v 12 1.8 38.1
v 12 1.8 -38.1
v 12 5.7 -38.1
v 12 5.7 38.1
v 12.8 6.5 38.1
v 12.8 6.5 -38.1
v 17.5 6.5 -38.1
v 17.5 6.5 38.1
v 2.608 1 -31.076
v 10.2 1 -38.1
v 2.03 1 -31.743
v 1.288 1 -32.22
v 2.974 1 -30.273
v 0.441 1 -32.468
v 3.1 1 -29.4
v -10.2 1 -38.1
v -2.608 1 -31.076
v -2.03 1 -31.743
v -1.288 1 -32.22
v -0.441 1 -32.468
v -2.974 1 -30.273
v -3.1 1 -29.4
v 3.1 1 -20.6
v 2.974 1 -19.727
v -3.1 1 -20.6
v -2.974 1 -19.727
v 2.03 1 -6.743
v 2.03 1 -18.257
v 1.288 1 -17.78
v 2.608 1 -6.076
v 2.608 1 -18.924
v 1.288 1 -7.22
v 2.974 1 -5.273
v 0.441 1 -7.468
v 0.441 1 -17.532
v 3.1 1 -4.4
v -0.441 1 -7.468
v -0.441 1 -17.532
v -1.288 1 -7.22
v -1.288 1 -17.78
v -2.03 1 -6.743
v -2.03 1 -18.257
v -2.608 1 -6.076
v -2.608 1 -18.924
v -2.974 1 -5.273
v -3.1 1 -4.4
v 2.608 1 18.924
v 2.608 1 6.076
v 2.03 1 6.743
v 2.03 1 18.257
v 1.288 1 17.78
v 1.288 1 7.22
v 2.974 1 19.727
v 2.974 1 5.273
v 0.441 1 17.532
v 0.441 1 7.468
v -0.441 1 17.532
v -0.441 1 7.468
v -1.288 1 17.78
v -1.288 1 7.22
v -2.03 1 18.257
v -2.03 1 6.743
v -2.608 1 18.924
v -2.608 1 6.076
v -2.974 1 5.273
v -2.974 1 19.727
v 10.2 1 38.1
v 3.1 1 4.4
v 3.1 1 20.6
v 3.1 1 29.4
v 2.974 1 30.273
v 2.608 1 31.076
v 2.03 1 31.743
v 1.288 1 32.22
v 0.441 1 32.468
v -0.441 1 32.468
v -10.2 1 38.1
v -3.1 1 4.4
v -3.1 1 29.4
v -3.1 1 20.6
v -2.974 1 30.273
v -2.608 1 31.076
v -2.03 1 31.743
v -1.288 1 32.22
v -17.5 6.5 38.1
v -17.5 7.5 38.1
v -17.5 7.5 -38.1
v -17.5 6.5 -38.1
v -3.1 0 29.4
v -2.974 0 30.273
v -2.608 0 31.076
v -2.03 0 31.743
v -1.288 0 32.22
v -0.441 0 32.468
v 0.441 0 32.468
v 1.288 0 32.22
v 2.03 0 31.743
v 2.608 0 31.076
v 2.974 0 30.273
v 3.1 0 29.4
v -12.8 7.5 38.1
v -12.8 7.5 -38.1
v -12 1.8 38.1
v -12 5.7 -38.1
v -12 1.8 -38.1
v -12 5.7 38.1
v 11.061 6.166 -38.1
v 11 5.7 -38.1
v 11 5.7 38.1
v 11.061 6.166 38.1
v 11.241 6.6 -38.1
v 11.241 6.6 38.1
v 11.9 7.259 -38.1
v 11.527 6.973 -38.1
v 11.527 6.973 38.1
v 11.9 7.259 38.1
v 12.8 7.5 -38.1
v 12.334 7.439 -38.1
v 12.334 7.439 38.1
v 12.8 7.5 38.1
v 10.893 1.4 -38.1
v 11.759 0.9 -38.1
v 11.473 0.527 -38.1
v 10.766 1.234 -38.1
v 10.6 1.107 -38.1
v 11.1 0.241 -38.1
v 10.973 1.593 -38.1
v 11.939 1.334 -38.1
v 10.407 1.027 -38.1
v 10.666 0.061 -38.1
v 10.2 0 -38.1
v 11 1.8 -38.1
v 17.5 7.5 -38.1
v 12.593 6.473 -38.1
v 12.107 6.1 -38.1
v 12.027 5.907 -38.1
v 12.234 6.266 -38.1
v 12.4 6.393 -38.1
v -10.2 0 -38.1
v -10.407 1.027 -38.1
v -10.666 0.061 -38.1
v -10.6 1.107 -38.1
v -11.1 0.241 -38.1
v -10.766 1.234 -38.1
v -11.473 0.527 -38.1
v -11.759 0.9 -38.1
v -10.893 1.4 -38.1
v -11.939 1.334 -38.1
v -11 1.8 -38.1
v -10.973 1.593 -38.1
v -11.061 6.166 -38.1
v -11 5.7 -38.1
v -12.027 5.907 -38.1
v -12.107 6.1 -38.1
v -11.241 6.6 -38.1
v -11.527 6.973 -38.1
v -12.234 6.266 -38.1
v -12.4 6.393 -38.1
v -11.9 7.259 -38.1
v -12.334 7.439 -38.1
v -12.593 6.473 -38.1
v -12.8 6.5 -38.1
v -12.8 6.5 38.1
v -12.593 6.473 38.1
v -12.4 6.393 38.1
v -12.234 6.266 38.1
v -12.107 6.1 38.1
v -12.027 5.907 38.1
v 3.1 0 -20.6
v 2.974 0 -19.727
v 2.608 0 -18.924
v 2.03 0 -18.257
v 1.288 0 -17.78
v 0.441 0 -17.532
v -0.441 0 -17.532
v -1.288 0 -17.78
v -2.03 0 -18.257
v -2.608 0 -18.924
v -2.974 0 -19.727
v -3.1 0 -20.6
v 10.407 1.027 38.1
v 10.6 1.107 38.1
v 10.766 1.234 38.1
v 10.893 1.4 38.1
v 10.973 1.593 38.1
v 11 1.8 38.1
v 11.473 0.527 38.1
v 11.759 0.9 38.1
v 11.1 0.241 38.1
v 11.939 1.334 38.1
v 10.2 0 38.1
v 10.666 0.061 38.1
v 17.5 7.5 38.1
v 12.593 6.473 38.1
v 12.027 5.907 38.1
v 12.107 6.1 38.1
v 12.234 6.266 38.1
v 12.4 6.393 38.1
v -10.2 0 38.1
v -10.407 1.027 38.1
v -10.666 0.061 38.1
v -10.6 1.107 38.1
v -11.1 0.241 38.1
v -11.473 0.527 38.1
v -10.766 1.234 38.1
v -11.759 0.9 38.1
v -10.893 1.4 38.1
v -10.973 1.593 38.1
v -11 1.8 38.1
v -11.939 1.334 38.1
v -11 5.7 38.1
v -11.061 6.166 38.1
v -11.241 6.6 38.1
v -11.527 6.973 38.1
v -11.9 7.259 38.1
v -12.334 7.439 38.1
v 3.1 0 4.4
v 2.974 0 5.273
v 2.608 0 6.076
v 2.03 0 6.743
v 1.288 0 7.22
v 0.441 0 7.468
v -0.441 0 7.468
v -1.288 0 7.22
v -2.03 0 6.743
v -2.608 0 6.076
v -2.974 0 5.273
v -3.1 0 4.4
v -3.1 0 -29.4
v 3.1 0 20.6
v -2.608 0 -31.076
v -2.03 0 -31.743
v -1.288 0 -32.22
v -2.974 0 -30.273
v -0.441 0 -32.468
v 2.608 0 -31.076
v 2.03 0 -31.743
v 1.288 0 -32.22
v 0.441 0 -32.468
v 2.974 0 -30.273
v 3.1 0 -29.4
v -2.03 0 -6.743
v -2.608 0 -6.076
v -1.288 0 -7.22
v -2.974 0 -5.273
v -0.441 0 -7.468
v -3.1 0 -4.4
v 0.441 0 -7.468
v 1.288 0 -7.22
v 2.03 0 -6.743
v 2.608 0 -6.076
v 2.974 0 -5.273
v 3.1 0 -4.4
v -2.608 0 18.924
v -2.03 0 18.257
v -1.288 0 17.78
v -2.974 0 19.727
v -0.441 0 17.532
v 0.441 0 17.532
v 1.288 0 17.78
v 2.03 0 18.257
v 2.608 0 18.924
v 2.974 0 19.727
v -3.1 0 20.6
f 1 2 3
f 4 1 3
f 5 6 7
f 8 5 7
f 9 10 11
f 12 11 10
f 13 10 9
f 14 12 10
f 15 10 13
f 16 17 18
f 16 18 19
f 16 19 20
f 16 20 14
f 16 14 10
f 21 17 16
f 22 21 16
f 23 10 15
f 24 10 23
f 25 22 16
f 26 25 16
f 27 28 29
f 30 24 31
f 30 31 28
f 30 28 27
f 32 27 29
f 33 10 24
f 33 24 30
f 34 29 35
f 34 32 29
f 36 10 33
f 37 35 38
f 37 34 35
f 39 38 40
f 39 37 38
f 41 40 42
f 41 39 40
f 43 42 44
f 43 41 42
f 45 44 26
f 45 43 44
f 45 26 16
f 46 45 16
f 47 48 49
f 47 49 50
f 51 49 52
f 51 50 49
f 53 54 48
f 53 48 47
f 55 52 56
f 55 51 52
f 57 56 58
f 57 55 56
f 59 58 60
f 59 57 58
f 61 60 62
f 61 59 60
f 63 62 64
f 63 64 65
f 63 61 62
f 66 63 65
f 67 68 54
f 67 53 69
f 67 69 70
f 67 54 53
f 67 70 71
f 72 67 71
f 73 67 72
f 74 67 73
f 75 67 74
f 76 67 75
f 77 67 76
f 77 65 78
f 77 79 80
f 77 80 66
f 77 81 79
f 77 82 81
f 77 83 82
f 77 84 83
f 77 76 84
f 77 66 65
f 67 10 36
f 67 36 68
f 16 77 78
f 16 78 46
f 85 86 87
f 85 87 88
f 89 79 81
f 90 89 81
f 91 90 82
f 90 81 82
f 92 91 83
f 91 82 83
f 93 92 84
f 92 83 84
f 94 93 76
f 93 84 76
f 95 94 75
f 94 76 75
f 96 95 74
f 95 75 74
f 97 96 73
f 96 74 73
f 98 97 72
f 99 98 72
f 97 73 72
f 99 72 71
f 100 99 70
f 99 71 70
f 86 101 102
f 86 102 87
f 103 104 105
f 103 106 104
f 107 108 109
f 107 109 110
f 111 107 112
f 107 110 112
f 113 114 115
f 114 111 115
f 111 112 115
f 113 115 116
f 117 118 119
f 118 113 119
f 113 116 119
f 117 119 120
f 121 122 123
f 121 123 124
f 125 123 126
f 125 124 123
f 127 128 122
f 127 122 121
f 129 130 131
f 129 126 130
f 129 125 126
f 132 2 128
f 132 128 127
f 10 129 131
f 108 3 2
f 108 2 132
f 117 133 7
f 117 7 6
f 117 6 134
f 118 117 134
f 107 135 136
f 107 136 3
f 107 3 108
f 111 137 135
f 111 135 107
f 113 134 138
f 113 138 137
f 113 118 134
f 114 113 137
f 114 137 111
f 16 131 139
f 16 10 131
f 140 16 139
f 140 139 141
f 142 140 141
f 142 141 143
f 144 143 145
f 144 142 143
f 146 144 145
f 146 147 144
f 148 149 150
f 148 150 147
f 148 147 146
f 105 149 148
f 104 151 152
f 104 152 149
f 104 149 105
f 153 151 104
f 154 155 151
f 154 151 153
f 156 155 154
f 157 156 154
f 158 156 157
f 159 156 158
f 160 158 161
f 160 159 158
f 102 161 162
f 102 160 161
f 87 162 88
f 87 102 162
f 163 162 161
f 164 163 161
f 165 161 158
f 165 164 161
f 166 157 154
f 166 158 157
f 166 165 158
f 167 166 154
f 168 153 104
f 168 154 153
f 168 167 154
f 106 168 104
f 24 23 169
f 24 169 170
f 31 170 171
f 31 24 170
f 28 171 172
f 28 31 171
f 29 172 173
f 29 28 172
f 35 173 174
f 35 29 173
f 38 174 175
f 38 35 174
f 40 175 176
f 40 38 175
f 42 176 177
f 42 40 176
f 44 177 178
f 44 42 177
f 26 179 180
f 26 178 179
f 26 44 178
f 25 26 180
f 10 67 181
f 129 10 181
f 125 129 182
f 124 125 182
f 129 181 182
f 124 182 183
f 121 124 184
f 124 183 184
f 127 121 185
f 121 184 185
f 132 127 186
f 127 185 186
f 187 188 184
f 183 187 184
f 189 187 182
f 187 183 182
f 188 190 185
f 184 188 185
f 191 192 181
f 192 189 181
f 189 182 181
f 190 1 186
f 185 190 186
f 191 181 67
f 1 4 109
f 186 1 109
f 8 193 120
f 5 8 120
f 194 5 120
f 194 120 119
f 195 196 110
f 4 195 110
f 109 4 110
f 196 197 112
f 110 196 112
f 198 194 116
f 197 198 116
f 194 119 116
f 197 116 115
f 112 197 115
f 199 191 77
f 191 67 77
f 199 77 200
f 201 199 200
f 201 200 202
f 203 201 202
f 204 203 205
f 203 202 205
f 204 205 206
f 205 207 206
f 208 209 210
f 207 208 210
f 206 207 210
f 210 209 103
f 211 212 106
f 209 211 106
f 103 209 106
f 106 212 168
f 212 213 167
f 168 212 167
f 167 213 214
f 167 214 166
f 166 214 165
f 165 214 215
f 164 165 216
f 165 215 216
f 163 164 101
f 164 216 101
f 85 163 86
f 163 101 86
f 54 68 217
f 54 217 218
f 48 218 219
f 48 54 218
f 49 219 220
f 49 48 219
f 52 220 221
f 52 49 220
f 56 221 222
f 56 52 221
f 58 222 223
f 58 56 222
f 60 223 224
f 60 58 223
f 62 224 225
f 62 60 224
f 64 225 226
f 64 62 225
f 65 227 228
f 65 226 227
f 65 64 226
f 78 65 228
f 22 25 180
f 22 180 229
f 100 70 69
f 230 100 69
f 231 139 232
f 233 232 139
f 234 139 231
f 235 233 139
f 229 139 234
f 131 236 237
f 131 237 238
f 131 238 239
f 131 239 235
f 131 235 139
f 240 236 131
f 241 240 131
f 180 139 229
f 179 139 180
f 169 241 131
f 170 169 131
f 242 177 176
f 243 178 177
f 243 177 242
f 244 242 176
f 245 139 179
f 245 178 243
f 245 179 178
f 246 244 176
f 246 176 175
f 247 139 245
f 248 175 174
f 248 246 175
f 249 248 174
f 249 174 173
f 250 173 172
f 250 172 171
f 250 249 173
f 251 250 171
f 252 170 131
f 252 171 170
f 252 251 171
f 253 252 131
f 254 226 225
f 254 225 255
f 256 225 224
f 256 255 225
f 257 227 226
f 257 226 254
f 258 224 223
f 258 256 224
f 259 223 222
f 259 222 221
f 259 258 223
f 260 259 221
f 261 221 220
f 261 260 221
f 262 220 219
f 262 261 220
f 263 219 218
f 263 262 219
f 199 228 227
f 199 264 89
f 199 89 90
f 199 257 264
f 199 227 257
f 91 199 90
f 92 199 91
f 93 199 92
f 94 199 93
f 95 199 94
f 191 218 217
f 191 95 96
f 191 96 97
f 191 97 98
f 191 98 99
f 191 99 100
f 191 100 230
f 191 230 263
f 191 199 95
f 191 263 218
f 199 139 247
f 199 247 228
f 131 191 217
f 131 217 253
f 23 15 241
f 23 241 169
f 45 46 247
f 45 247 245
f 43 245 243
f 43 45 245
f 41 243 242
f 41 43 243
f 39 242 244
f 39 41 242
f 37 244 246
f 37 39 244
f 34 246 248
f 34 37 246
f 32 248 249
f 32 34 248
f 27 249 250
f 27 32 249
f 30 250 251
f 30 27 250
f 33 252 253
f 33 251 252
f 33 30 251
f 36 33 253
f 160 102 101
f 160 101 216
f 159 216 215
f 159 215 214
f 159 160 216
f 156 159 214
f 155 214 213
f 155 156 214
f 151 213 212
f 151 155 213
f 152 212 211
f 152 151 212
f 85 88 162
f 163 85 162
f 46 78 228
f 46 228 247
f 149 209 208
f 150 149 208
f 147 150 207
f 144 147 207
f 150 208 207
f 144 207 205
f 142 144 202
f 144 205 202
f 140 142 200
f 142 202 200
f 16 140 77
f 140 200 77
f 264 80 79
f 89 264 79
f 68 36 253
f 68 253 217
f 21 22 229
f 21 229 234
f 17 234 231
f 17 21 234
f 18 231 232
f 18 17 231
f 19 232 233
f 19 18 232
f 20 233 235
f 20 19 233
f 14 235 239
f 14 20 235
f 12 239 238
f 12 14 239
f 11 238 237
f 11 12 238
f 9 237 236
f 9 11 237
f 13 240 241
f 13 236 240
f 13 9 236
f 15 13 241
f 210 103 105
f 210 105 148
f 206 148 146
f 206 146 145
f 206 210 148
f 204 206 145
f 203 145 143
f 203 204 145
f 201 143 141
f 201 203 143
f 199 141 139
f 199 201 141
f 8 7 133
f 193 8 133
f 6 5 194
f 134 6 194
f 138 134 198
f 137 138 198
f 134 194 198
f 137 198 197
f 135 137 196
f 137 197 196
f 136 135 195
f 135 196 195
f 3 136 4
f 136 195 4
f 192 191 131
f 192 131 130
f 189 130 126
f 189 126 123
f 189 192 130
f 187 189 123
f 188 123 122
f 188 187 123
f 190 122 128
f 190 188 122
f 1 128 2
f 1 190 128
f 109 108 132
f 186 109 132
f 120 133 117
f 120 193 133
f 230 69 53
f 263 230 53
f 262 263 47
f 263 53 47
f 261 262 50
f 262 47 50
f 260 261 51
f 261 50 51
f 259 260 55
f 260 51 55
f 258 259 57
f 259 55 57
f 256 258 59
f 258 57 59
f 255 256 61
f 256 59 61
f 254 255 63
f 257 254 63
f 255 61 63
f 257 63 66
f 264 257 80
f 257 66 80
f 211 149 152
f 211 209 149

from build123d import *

# Parameters (mm, degrees)
BASE_EXTRUDE_THIN_DEPTH = 254
FILLET1_R               = 0.8
FILLET2_R               = 1.8
CUT_EXTRUDE1_DEPTH      = 255.685099682
LPATTERN1_COUNT         = 10
LPATTERN1_PITCH         = 25
MIRROR1_COPY_1_DEPTH    = 255.685099682
MIRROR1_COPY_2_DEPTH    = 255.685099682
MIRROR1_COPY_3_DEPTH    = 255.685099682
MIRROR1_COPY_4_DEPTH    = 255.685099682
MIRROR1_COPY_5_DEPTH    = 255.685099682
MIRROR1_COPY_6_DEPTH    = 255.685099682
MIRROR1_COPY_7_DEPTH    = 255.685099682
MIRROR1_COPY_8_DEPTH    = 255.685099682
MIRROR1_COPY_9_DEPTH    = 255.685099682
MIRROR1_COPY_10_DEPTH   = 255.685099682
SKETCH3_OUTSIDE_W       = 138.852
SKETCH3_OUTSIDE_H       = 611.852
SKETCH3_OUTSIDE_W_2     = 99.454563768
SKETCH3_OUTSIDE_H_2     = 76.2
CUT_EXTRUDE2_3_DEPTH    = 255.712583121


with BuildPart() as part:
    # Sketch1 → Base-Extrude-Thin (new, symmetric)
    with BuildSketch(Plane.XY):
        Polygon((-17.5, 6.5), (-12, 6.5), (-12, 0), (12, 0), (12, 6.5), (17.5, 6.5), (17.5, 7.5), (11, 7.5), (11, 1), (-11, 1), (-11, 7.5), (-17.5, 7.5), align=None)
    extrude(amount=BASE_EXTRUDE_THIN_DEPTH, both=True)

    # Fillet1
    fillet1_edges = [part.edges().sort_by_distance(p)[0] for p in [
        (-11, 1, 0),
        (11, 1, 0),
        (12, 6.5, 0),
        (-12, 6.5, 0),
    ]]
    fillet(fillet1_edges, radius=FILLET1_R)

    # Fillet2
    fillet2_edges = [part.edges().sort_by_distance(p)[0] for p in [
        (-11, 7.5, 0),
        (11, 7.5, 0),
        (12, 0, 0),
        (-12, 0, 0),
    ]]
    fillet(fillet2_edges, radius=FILLET2_R)

    # Sketch2 → Cut-Extrude1 (cut, through all)
    with BuildSketch(Plane(origin=(0, 1, 0), x_dir=(-1, 0, 0), z_dir=(0, 1, 0))):
        with BuildLine():
            Line((3.1, 4.4), (3.1, -4.4))
            ThreePointArc((3.1, -4.4), (0, -7.5), (-3.1, -4.4))
            Line((-3.1, -4.4), (-3.1, 4.4))
            ThreePointArc((-3.1, 4.4), (0, 7.5), (3.1, 4.4))
        make_face()
    cut_extrude1 = extrude(amount=-CUT_EXTRUDE1_DEPTH, mode=Mode.SUBTRACT)

    # LPattern1: Cut-Extrude1 ×10
    with Locations(*[(0, 0, -i * LPATTERN1_PITCH) for i in range(1, LPATTERN1_COUNT)]):
        add(cut_extrude1, mode=Mode.SUBTRACT)

    # Mirror1 copy 1 sketch → Mirror1 copy 1 (cut, through all)
    with BuildSketch(Plane(origin=(0, 1, 25), x_dir=(-1, 0, 0), z_dir=(0, 1, 0))):
        with BuildLine():
            Line((3.1, -4.4), (3.1, 4.4))
            ThreePointArc((3.1, 4.4), (0, 7.5), (-3.1, 4.4))
            Line((-3.1, 4.4), (-3.1, -4.4))
            ThreePointArc((-3.1, -4.4), (0, -7.5), (3.1, -4.4))
        make_face()
    extrude(amount=-MIRROR1_COPY_1_DEPTH, mode=Mode.SUBTRACT)

    # Mirror1 copy 2 sketch → Mirror1 copy 2 (cut, through all)
    with BuildSketch(Plane(origin=(0, 1, 50), x_dir=(-1, 0, 0), z_dir=(0, 1, 0))):
        with BuildLine():
            Line((3.1, -4.4), (3.1, 4.4))
            ThreePointArc((3.1, 4.4), (0, 7.5), (-3.1, 4.4))
            Line((-3.1, 4.4), (-3.1, -4.4))
            ThreePointArc((-3.1, -4.4), (0, -7.5), (3.1, -4.4))
        make_face()
    extrude(amount=-MIRROR1_COPY_2_DEPTH, mode=Mode.SUBTRACT)

    # Mirror1 copy 3 sketch → Mirror1 copy 3 (cut, through all)
    with BuildSketch(Plane(origin=(0, 1, 75), x_dir=(-1, 0, 0), z_dir=(0, 1, 0))):
        with BuildLine():
            Line((3.1, -4.4), (3.1, 4.4))
            ThreePointArc((3.1, 4.4), (0, 7.5), (-3.1, 4.4))
            Line((-3.1, 4.4), (-3.1, -4.4))
            ThreePointArc((-3.1, -4.4), (0, -7.5), (3.1, -4.4))
        make_face()
    extrude(amount=-MIRROR1_COPY_3_DEPTH, mode=Mode.SUBTRACT)

    # Mirror1 copy 4 sketch → Mirror1 copy 4 (cut, through all)
    with BuildSketch(Plane(origin=(0, 1, 100), x_dir=(-1, 0, 0), z_dir=(0, 1, 0))):
        with BuildLine():
            Line((3.1, -4.4), (3.1, 4.4))
            ThreePointArc((3.1, 4.4), (0, 7.5), (-3.1, 4.4))
            Line((-3.1, 4.4), (-3.1, -4.4))
            ThreePointArc((-3.1, -4.4), (0, -7.5), (3.1, -4.4))
        make_face()
    extrude(amount=-MIRROR1_COPY_4_DEPTH, mode=Mode.SUBTRACT)

    # Mirror1 copy 5 sketch → Mirror1 copy 5 (cut, through all)
    with BuildSketch(Plane(origin=(0, 1, 125), x_dir=(-1, 0, 0), z_dir=(0, 1, 0))):
        with BuildLine():
            Line((3.1, -4.4), (3.1, 4.4))
            ThreePointArc((3.1, 4.4), (0, 7.5), (-3.1, 4.4))
            Line((-3.1, 4.4), (-3.1, -4.4))
            ThreePointArc((-3.1, -4.4), (0, -7.5), (3.1, -4.4))
        make_face()
    extrude(amount=-MIRROR1_COPY_5_DEPTH, mode=Mode.SUBTRACT)

    # Mirror1 copy 6 sketch → Mirror1 copy 6 (cut, through all)
    with BuildSketch(Plane(origin=(0, 1, 150), x_dir=(-1, 0, 0), z_dir=(0, 1, 0))):
        with BuildLine():
            Line((3.1, -4.4), (3.1, 4.4))
            ThreePointArc((3.1, 4.4), (0, 7.5), (-3.1, 4.4))
            Line((-3.1, 4.4), (-3.1, -4.4))
            ThreePointArc((-3.1, -4.4), (0, -7.5), (3.1, -4.4))
        make_face()
    extrude(amount=-MIRROR1_COPY_6_DEPTH, mode=Mode.SUBTRACT)

    # Mirror1 copy 7 sketch → Mirror1 copy 7 (cut, through all)
    with BuildSketch(Plane(origin=(0, 1, 175), x_dir=(-1, 0, 0), z_dir=(0, 1, 0))):
        with BuildLine():
            Line((3.1, -4.4), (3.1, 4.4))
            ThreePointArc((3.1, 4.4), (0, 7.5), (-3.1, 4.4))
            Line((-3.1, 4.4), (-3.1, -4.4))
            ThreePointArc((-3.1, -4.4), (0, -7.5), (3.1, -4.4))
        make_face()
    extrude(amount=-MIRROR1_COPY_7_DEPTH, mode=Mode.SUBTRACT)

    # Mirror1 copy 8 sketch → Mirror1 copy 8 (cut, through all)
    with BuildSketch(Plane(origin=(0, 1, 200), x_dir=(-1, 0, 0), z_dir=(0, 1, 0))):
        with BuildLine():
            Line((3.1, -4.4), (3.1, 4.4))
            ThreePointArc((3.1, 4.4), (0, 7.5), (-3.1, 4.4))
            Line((-3.1, 4.4), (-3.1, -4.4))
            ThreePointArc((-3.1, -4.4), (0, -7.5), (3.1, -4.4))
        make_face()
    extrude(amount=-MIRROR1_COPY_8_DEPTH, mode=Mode.SUBTRACT)

    # Mirror1 copy 9 sketch → Mirror1 copy 9 (cut, through all)
    with BuildSketch(Plane(origin=(0, 1, 225), x_dir=(-1, 0, 0), z_dir=(0, 1, 0))):
        with BuildLine():
            Line((3.1, -4.4), (3.1, 4.4))
            ThreePointArc((3.1, 4.4), (0, 7.5), (-3.1, 4.4))
            Line((-3.1, 4.4), (-3.1, -4.4))
            ThreePointArc((-3.1, -4.4), (0, -7.5), (3.1, -4.4))
        make_face()
    extrude(amount=-MIRROR1_COPY_9_DEPTH, mode=Mode.SUBTRACT)

    # Mirror1 copy 10 sketch → Mirror1 copy 10 (cut, through all)
    with BuildSketch(Plane(origin=(0, 1, 0), x_dir=(-1, 0, 0), z_dir=(0, 1, 0))):
        with BuildLine():
            Line((3.1, -4.4), (3.1, 4.4))
            ThreePointArc((3.1, 4.4), (0, 7.5), (-3.1, 4.4))
            Line((-3.1, 4.4), (-3.1, -4.4))
            ThreePointArc((-3.1, -4.4), (0, -7.5), (3.1, -4.4))
        make_face()
    extrude(amount=-MIRROR1_COPY_10_DEPTH, mode=Mode.SUBTRACT)

    # Sketch3 outside → Cut-Extrude2 (3") (cut, through all)
    with BuildSketch(Plane(origin=(0, 7.5, 0), x_dir=(-1, 0, 0), z_dir=(0, 1, 0))):
        Rectangle(SKETCH3_OUTSIDE_W, SKETCH3_OUTSIDE_H)
        with Locations((-1.499324946, 0)):
            Rectangle(SKETCH3_OUTSIDE_W_2, SKETCH3_OUTSIDE_H_2, mode=Mode.SUBTRACT)
    extrude(amount=-CUT_EXTRUDE2_3_DEPTH, mode=Mode.SUBTRACT)


solid = part.part
